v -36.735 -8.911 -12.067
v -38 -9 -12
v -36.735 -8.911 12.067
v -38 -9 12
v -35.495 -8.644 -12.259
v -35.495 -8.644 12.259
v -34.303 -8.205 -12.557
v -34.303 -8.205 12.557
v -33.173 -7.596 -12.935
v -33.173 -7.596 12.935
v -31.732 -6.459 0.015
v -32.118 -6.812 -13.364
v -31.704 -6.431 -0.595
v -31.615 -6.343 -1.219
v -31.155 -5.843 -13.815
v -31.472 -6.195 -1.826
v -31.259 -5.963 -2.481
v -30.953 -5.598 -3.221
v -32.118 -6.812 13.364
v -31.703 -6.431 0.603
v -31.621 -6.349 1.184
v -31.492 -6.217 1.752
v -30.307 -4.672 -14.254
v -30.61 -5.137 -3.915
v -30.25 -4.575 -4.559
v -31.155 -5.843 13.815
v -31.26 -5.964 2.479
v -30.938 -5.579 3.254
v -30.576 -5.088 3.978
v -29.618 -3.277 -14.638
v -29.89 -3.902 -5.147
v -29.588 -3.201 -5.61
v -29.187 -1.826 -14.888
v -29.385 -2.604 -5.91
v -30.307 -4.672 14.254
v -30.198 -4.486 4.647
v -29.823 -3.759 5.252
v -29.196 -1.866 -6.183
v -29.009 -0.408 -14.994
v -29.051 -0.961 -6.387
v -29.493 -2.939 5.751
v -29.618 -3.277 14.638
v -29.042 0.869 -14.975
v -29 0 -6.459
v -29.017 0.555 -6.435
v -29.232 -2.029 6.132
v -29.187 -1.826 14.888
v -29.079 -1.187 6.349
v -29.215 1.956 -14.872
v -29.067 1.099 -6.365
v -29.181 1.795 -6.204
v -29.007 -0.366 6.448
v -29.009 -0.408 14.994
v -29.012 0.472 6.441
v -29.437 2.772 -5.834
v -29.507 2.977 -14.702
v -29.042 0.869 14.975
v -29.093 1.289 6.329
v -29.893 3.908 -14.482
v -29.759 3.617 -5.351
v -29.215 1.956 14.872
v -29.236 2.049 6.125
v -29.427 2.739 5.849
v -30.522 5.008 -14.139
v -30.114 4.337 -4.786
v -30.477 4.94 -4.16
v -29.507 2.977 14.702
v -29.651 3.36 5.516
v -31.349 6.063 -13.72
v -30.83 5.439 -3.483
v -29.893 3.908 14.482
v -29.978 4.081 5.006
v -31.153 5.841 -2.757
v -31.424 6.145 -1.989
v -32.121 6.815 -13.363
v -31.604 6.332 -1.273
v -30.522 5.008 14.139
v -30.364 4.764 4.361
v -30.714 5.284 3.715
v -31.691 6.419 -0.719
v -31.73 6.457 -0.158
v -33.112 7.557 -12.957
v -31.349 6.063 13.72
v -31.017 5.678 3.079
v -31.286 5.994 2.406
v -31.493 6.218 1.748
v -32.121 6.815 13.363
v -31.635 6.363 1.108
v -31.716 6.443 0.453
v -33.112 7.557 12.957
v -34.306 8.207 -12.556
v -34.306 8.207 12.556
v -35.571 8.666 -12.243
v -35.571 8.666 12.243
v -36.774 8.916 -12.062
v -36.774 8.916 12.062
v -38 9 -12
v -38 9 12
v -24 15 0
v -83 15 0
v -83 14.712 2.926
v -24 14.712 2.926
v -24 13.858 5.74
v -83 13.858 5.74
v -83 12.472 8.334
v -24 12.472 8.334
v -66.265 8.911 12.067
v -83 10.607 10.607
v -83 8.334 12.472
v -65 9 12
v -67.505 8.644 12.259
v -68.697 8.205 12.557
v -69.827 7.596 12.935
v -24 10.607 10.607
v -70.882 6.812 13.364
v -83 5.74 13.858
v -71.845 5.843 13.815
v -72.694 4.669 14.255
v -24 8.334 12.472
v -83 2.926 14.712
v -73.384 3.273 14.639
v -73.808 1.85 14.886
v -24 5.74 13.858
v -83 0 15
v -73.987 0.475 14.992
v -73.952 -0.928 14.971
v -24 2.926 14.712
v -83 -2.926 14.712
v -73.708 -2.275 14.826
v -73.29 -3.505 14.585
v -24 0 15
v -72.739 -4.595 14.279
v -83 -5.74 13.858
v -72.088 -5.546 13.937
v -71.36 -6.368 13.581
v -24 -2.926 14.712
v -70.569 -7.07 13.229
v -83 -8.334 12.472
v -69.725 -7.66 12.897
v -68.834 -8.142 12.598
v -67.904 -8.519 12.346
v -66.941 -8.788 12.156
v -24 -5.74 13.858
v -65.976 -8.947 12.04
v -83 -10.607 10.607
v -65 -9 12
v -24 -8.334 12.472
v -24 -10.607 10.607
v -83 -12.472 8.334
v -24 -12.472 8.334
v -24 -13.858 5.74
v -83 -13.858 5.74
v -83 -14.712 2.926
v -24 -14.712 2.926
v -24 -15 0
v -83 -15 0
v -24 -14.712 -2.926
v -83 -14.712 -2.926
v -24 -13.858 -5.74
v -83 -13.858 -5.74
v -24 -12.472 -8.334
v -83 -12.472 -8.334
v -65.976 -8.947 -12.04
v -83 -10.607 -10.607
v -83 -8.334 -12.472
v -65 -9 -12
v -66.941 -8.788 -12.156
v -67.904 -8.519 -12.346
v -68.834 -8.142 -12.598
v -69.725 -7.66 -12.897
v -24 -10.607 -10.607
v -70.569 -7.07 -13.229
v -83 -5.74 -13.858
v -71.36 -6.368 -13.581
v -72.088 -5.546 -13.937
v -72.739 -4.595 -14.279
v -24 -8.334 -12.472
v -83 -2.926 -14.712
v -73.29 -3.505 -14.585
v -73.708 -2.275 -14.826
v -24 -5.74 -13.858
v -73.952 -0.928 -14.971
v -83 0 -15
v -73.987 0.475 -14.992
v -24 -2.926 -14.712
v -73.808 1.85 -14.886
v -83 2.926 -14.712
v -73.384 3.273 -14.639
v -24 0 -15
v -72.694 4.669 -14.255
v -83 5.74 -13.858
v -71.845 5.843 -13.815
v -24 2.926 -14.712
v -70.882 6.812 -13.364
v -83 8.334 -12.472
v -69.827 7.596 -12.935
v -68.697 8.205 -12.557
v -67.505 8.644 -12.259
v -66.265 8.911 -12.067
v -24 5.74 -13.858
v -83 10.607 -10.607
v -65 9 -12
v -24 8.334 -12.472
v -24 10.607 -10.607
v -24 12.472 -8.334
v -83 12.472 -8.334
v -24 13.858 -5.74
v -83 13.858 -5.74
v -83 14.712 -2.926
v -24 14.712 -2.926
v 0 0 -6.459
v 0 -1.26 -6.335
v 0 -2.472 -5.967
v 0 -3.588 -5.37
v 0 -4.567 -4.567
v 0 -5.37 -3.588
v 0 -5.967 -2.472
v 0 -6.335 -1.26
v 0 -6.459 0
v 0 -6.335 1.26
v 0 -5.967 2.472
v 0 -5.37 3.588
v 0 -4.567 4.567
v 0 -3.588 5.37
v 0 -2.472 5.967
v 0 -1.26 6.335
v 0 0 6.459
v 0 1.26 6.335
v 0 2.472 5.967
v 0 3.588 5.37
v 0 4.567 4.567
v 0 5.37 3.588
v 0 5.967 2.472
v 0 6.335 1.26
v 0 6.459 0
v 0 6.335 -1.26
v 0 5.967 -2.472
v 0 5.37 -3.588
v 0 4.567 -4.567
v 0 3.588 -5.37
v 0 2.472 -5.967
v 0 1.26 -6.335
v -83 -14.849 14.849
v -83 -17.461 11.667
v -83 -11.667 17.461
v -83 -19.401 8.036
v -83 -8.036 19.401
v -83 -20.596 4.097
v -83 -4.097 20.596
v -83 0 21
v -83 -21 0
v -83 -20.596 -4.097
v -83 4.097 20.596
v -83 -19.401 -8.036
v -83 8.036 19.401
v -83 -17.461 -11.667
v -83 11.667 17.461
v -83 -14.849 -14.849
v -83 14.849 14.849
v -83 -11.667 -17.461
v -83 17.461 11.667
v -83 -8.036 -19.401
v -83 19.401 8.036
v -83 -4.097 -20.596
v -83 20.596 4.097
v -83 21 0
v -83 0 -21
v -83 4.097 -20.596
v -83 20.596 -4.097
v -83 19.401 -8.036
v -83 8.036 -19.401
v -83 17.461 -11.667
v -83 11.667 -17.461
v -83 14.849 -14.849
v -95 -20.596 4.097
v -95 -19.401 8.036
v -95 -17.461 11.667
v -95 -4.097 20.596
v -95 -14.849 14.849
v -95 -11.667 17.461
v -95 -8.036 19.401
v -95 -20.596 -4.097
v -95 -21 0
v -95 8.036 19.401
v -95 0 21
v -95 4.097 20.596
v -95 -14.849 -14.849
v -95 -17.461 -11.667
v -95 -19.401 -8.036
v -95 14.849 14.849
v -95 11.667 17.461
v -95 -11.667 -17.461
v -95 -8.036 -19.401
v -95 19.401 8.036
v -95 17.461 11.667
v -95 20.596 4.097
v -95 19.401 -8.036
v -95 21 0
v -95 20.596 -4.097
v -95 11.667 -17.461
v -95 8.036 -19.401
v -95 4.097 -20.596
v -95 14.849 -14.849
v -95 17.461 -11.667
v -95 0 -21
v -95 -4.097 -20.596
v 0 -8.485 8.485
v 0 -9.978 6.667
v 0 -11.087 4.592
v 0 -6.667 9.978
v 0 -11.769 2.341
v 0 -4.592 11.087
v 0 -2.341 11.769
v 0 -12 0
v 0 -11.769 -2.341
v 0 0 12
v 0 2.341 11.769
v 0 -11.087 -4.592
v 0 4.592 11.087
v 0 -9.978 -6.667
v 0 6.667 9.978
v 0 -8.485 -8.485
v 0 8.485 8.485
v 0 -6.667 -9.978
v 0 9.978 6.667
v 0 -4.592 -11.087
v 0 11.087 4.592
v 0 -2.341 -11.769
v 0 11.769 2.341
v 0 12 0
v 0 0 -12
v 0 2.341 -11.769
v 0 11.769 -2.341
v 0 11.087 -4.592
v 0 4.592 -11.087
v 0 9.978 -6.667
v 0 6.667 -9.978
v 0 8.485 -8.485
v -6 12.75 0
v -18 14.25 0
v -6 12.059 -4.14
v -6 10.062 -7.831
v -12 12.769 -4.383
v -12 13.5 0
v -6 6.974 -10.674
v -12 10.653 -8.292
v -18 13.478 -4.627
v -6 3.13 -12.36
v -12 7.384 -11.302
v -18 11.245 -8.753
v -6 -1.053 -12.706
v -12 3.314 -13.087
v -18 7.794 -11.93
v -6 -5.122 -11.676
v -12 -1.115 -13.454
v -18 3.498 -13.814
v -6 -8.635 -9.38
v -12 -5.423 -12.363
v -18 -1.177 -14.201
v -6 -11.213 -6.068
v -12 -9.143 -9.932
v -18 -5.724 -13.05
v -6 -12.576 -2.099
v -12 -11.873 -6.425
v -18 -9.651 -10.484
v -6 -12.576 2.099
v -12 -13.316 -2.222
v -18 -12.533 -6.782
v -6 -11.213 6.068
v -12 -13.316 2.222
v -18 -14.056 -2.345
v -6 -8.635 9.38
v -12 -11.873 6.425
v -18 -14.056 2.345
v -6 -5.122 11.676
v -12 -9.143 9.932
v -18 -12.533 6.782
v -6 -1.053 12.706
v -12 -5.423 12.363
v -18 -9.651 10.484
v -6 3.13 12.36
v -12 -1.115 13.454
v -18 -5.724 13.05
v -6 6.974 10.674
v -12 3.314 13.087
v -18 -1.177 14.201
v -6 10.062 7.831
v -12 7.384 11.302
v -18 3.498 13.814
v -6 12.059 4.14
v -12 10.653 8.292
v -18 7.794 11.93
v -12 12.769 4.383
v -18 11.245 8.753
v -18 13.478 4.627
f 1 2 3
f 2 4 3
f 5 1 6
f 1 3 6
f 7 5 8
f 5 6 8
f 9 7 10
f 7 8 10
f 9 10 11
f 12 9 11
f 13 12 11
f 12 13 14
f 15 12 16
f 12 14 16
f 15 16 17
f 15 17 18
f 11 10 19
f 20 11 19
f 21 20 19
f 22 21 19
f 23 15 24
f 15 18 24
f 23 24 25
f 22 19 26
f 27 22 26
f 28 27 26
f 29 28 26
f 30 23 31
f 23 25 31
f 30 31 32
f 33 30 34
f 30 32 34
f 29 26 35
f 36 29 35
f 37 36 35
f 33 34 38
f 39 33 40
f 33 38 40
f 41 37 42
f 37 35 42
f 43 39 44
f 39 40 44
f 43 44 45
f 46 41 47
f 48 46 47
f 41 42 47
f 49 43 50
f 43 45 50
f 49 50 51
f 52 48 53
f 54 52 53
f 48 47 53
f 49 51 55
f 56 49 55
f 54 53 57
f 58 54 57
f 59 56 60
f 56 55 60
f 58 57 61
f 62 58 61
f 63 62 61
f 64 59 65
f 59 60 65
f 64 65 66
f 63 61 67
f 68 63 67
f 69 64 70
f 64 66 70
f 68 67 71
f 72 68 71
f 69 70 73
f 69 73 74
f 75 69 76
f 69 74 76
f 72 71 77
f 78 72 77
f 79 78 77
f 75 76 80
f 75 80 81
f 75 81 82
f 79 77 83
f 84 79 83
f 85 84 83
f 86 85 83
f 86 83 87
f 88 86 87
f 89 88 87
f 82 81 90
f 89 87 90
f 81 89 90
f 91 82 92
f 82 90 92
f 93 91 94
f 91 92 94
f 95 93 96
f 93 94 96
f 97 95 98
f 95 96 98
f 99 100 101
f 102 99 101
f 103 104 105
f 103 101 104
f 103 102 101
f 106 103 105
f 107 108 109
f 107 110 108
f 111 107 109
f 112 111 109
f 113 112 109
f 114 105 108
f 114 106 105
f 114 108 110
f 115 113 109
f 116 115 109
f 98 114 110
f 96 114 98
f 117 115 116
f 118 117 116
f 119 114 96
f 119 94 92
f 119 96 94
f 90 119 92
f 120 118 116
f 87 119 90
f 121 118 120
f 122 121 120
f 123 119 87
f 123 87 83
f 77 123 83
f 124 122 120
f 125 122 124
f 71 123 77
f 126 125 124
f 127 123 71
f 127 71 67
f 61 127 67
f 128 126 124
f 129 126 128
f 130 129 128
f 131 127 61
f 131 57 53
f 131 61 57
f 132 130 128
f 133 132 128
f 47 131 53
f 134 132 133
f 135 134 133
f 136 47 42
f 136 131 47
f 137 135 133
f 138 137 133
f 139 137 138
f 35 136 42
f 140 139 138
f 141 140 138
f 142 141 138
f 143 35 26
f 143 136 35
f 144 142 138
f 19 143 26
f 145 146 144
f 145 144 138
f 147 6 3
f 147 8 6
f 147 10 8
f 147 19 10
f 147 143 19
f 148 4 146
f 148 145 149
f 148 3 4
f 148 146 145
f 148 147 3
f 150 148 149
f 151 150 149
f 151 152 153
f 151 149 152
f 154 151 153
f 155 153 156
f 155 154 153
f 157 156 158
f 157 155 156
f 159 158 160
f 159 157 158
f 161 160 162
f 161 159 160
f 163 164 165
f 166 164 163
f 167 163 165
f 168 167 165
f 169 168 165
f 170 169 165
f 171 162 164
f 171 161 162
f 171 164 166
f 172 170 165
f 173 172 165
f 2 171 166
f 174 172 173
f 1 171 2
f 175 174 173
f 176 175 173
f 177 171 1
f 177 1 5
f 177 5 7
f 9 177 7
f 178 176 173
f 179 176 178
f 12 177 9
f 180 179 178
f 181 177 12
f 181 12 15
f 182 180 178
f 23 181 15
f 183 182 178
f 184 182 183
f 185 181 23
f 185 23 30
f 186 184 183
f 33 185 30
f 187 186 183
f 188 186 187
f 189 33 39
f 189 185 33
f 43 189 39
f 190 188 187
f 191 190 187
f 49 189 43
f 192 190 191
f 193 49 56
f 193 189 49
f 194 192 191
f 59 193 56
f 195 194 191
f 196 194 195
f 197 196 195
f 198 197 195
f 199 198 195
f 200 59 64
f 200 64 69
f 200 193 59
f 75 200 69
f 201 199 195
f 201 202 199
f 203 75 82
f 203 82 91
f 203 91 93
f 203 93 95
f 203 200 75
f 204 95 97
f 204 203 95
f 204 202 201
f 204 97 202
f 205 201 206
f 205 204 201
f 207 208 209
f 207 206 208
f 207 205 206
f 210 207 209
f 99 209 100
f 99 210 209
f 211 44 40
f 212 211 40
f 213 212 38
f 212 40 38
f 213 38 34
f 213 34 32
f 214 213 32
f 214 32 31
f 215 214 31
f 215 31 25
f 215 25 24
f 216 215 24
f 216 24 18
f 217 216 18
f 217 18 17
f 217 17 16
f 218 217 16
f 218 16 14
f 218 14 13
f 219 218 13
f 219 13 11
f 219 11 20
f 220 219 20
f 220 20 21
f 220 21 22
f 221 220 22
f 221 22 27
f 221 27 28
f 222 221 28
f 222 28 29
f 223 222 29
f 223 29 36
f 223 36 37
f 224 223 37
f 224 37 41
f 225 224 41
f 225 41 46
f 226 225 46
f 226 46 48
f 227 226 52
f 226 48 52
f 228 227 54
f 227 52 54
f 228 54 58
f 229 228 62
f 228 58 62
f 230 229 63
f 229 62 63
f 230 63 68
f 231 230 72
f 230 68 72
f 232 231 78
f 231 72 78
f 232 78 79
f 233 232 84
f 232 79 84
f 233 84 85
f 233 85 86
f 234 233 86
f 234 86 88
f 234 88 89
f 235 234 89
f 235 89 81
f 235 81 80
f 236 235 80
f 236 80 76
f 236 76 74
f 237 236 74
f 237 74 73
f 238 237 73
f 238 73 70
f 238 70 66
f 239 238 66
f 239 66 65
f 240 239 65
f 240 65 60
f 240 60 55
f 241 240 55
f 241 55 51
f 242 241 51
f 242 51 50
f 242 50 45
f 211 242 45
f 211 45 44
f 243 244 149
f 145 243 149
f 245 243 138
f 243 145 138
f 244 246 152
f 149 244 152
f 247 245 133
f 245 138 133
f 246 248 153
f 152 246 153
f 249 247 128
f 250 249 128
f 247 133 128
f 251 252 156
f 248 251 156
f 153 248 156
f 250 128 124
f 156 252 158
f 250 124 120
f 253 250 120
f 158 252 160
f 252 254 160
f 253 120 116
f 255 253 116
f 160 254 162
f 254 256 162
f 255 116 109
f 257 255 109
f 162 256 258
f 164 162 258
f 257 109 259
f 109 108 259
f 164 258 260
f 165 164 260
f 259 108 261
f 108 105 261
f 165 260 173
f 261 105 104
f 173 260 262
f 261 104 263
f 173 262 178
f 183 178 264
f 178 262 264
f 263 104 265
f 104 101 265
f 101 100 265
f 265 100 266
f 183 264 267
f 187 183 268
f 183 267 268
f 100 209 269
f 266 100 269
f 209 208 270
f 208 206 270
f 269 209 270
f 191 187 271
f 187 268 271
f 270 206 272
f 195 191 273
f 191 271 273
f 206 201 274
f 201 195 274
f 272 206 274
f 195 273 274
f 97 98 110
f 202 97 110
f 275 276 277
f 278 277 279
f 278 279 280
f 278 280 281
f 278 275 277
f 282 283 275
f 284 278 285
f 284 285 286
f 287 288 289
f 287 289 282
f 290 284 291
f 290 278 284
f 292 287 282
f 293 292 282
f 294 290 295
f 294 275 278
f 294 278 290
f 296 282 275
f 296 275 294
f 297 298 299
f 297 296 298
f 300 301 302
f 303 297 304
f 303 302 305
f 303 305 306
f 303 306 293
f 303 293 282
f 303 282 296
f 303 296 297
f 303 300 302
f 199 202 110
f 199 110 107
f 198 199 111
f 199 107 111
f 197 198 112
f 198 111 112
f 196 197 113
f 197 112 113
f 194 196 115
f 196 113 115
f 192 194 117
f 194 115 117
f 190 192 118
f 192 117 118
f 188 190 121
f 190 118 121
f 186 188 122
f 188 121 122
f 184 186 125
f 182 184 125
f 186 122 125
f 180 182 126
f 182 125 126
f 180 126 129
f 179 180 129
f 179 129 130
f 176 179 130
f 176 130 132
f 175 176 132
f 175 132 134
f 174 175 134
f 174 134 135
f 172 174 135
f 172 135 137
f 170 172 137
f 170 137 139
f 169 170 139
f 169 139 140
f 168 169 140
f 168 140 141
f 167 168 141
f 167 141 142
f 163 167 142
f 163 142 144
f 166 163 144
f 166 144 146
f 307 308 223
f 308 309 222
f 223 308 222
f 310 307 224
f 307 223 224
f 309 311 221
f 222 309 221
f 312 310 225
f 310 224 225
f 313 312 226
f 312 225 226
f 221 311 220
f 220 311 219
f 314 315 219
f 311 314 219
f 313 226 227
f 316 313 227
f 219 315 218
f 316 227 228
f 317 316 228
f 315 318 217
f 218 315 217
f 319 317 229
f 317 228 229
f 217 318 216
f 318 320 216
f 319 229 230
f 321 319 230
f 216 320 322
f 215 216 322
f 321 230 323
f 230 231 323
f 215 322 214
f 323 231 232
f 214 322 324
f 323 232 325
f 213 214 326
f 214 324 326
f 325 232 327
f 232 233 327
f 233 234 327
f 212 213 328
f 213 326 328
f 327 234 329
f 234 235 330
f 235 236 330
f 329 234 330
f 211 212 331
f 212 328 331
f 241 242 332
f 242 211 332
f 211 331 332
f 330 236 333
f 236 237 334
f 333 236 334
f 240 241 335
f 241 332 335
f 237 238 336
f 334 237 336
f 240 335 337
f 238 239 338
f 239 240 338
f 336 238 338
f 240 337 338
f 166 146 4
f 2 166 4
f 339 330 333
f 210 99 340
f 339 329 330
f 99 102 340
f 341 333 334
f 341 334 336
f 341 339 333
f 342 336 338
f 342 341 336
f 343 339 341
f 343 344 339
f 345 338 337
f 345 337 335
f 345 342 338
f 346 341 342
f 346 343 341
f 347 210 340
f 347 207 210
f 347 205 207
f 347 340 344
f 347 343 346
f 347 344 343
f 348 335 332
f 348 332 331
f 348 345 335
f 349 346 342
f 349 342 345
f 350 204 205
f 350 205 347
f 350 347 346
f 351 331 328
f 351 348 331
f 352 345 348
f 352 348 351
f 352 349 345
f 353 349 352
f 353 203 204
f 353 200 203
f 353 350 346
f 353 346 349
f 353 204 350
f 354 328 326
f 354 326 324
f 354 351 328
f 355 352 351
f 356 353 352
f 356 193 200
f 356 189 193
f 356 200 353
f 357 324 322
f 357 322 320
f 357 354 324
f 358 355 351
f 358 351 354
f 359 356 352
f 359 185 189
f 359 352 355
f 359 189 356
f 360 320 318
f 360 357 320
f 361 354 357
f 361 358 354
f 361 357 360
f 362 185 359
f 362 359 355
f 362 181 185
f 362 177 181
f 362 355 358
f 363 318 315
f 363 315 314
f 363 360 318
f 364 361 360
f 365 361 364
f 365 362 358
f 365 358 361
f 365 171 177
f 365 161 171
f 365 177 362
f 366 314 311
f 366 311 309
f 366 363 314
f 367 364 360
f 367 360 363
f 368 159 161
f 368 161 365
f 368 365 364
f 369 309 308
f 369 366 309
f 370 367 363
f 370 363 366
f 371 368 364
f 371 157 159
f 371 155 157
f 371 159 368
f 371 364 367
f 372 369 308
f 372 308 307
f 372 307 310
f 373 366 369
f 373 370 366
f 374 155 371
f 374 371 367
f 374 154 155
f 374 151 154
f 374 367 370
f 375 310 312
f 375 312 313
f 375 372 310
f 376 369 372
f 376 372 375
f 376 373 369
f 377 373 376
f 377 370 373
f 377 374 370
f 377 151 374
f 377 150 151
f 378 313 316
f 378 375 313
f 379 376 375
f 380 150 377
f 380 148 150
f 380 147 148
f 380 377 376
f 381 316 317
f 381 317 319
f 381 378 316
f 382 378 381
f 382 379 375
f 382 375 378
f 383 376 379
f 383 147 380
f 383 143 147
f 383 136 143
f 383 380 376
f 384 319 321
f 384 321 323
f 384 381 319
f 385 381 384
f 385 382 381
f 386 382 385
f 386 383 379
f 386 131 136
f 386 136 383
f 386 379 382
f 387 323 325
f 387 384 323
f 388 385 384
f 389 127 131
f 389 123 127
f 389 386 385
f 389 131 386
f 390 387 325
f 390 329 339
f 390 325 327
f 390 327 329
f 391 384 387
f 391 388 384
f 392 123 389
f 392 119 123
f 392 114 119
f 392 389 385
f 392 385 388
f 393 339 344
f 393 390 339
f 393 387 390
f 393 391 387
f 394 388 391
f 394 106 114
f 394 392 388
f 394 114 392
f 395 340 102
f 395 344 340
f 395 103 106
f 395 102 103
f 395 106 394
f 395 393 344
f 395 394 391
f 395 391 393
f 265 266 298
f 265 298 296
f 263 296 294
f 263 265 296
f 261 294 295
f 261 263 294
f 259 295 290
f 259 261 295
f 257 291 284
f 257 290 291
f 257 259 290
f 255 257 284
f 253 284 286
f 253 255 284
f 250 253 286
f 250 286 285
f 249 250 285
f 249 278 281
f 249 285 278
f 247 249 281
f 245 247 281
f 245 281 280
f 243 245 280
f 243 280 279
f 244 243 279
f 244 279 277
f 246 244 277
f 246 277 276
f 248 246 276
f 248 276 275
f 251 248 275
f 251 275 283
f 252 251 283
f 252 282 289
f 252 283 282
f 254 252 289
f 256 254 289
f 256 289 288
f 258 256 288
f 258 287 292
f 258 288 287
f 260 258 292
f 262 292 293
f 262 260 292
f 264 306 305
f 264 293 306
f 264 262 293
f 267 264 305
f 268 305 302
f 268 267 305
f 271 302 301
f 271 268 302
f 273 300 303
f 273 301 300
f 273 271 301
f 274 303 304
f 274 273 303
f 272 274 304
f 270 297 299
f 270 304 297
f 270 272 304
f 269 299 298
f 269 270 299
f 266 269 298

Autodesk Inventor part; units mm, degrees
ref_plane "YZ Plane" through (0, 0, 0) normal (1, 0, 0) x (0, 1, 0)
ref_plane "XZ Plane" through (0, 0, 0) normal (0, 1, 0) x (-1, 0, 0)
ref_plane "XY Plane" through (0, 0, 0) normal (0, 0, 1) x (1, 0, 0)
sketch "Sketch1" plane through (0, 0, 0) normal (0, 0, 1) x (1, 0, 0)
  line L0 (0, 0) -> (-95, 0)
  line L1 (-95, 0) -> (-95, 21)
  line L2 (-95, 21) -> (-83, 21)
  line L3 (-83, 21) -> (-83, 15)
  line L4 (-83, 15) -> (-24, 15)
  line L5 (-24, 15) -> (0, 12)
  line L6 (0, 12) -> (0, 0)
  dimension "d0" = 12
  dimension "d1" = 59
  dimension "d2" = 24
  dimension "d3" = 12
  dimension "d4" = 21
  dimension "d5" = 15
revolve "Revolution1" add sketch "Sketch1" angle 360 about axis through (0, 0, 0) along (-1, 0, 0)
sketch "Sketch2" plane through (0, 0, 0) normal (0, 0, 1) x (1, 0, 0)
  line L0 (-65, 0) -> (-38, 0) construction
  line L1 (-65, -9) -> (-38, -9)
  line L2 (-38, 9) -> (-65, 9)
  arc A0 (-65, 9) -> (-65, -9) centre (-65, 0) ccw
  arc A1 (-38, -9) -> (-38, 9) centre (-38, 0) ccw
  line L3 (-95, -21) -> (-95, 21) projected
  point P0 (0, 0)
  point P1 (-51.5, 0)
  dimension "d7" = 27
  dimension "d8" = 30
  dimension "d9" = 9
extrude "Extrusion1" cut sketch "Sketch2" against normal through all both and the other way through all
sketch "Sketch3" plane through (0, 0, 0) normal (1, 0, 0) x (0, 0, -1)
  point P0 (0, 0)
  point P1 (0, 0)
hole "Hole1" at (0, 0, 0) direction (-1, 0, 0) diameter 12.9175 depth 40 tip angle 118 thread size "M14x1" class "6H" standard "ANSI Metric M Profile"
properties part number "tool holder"
